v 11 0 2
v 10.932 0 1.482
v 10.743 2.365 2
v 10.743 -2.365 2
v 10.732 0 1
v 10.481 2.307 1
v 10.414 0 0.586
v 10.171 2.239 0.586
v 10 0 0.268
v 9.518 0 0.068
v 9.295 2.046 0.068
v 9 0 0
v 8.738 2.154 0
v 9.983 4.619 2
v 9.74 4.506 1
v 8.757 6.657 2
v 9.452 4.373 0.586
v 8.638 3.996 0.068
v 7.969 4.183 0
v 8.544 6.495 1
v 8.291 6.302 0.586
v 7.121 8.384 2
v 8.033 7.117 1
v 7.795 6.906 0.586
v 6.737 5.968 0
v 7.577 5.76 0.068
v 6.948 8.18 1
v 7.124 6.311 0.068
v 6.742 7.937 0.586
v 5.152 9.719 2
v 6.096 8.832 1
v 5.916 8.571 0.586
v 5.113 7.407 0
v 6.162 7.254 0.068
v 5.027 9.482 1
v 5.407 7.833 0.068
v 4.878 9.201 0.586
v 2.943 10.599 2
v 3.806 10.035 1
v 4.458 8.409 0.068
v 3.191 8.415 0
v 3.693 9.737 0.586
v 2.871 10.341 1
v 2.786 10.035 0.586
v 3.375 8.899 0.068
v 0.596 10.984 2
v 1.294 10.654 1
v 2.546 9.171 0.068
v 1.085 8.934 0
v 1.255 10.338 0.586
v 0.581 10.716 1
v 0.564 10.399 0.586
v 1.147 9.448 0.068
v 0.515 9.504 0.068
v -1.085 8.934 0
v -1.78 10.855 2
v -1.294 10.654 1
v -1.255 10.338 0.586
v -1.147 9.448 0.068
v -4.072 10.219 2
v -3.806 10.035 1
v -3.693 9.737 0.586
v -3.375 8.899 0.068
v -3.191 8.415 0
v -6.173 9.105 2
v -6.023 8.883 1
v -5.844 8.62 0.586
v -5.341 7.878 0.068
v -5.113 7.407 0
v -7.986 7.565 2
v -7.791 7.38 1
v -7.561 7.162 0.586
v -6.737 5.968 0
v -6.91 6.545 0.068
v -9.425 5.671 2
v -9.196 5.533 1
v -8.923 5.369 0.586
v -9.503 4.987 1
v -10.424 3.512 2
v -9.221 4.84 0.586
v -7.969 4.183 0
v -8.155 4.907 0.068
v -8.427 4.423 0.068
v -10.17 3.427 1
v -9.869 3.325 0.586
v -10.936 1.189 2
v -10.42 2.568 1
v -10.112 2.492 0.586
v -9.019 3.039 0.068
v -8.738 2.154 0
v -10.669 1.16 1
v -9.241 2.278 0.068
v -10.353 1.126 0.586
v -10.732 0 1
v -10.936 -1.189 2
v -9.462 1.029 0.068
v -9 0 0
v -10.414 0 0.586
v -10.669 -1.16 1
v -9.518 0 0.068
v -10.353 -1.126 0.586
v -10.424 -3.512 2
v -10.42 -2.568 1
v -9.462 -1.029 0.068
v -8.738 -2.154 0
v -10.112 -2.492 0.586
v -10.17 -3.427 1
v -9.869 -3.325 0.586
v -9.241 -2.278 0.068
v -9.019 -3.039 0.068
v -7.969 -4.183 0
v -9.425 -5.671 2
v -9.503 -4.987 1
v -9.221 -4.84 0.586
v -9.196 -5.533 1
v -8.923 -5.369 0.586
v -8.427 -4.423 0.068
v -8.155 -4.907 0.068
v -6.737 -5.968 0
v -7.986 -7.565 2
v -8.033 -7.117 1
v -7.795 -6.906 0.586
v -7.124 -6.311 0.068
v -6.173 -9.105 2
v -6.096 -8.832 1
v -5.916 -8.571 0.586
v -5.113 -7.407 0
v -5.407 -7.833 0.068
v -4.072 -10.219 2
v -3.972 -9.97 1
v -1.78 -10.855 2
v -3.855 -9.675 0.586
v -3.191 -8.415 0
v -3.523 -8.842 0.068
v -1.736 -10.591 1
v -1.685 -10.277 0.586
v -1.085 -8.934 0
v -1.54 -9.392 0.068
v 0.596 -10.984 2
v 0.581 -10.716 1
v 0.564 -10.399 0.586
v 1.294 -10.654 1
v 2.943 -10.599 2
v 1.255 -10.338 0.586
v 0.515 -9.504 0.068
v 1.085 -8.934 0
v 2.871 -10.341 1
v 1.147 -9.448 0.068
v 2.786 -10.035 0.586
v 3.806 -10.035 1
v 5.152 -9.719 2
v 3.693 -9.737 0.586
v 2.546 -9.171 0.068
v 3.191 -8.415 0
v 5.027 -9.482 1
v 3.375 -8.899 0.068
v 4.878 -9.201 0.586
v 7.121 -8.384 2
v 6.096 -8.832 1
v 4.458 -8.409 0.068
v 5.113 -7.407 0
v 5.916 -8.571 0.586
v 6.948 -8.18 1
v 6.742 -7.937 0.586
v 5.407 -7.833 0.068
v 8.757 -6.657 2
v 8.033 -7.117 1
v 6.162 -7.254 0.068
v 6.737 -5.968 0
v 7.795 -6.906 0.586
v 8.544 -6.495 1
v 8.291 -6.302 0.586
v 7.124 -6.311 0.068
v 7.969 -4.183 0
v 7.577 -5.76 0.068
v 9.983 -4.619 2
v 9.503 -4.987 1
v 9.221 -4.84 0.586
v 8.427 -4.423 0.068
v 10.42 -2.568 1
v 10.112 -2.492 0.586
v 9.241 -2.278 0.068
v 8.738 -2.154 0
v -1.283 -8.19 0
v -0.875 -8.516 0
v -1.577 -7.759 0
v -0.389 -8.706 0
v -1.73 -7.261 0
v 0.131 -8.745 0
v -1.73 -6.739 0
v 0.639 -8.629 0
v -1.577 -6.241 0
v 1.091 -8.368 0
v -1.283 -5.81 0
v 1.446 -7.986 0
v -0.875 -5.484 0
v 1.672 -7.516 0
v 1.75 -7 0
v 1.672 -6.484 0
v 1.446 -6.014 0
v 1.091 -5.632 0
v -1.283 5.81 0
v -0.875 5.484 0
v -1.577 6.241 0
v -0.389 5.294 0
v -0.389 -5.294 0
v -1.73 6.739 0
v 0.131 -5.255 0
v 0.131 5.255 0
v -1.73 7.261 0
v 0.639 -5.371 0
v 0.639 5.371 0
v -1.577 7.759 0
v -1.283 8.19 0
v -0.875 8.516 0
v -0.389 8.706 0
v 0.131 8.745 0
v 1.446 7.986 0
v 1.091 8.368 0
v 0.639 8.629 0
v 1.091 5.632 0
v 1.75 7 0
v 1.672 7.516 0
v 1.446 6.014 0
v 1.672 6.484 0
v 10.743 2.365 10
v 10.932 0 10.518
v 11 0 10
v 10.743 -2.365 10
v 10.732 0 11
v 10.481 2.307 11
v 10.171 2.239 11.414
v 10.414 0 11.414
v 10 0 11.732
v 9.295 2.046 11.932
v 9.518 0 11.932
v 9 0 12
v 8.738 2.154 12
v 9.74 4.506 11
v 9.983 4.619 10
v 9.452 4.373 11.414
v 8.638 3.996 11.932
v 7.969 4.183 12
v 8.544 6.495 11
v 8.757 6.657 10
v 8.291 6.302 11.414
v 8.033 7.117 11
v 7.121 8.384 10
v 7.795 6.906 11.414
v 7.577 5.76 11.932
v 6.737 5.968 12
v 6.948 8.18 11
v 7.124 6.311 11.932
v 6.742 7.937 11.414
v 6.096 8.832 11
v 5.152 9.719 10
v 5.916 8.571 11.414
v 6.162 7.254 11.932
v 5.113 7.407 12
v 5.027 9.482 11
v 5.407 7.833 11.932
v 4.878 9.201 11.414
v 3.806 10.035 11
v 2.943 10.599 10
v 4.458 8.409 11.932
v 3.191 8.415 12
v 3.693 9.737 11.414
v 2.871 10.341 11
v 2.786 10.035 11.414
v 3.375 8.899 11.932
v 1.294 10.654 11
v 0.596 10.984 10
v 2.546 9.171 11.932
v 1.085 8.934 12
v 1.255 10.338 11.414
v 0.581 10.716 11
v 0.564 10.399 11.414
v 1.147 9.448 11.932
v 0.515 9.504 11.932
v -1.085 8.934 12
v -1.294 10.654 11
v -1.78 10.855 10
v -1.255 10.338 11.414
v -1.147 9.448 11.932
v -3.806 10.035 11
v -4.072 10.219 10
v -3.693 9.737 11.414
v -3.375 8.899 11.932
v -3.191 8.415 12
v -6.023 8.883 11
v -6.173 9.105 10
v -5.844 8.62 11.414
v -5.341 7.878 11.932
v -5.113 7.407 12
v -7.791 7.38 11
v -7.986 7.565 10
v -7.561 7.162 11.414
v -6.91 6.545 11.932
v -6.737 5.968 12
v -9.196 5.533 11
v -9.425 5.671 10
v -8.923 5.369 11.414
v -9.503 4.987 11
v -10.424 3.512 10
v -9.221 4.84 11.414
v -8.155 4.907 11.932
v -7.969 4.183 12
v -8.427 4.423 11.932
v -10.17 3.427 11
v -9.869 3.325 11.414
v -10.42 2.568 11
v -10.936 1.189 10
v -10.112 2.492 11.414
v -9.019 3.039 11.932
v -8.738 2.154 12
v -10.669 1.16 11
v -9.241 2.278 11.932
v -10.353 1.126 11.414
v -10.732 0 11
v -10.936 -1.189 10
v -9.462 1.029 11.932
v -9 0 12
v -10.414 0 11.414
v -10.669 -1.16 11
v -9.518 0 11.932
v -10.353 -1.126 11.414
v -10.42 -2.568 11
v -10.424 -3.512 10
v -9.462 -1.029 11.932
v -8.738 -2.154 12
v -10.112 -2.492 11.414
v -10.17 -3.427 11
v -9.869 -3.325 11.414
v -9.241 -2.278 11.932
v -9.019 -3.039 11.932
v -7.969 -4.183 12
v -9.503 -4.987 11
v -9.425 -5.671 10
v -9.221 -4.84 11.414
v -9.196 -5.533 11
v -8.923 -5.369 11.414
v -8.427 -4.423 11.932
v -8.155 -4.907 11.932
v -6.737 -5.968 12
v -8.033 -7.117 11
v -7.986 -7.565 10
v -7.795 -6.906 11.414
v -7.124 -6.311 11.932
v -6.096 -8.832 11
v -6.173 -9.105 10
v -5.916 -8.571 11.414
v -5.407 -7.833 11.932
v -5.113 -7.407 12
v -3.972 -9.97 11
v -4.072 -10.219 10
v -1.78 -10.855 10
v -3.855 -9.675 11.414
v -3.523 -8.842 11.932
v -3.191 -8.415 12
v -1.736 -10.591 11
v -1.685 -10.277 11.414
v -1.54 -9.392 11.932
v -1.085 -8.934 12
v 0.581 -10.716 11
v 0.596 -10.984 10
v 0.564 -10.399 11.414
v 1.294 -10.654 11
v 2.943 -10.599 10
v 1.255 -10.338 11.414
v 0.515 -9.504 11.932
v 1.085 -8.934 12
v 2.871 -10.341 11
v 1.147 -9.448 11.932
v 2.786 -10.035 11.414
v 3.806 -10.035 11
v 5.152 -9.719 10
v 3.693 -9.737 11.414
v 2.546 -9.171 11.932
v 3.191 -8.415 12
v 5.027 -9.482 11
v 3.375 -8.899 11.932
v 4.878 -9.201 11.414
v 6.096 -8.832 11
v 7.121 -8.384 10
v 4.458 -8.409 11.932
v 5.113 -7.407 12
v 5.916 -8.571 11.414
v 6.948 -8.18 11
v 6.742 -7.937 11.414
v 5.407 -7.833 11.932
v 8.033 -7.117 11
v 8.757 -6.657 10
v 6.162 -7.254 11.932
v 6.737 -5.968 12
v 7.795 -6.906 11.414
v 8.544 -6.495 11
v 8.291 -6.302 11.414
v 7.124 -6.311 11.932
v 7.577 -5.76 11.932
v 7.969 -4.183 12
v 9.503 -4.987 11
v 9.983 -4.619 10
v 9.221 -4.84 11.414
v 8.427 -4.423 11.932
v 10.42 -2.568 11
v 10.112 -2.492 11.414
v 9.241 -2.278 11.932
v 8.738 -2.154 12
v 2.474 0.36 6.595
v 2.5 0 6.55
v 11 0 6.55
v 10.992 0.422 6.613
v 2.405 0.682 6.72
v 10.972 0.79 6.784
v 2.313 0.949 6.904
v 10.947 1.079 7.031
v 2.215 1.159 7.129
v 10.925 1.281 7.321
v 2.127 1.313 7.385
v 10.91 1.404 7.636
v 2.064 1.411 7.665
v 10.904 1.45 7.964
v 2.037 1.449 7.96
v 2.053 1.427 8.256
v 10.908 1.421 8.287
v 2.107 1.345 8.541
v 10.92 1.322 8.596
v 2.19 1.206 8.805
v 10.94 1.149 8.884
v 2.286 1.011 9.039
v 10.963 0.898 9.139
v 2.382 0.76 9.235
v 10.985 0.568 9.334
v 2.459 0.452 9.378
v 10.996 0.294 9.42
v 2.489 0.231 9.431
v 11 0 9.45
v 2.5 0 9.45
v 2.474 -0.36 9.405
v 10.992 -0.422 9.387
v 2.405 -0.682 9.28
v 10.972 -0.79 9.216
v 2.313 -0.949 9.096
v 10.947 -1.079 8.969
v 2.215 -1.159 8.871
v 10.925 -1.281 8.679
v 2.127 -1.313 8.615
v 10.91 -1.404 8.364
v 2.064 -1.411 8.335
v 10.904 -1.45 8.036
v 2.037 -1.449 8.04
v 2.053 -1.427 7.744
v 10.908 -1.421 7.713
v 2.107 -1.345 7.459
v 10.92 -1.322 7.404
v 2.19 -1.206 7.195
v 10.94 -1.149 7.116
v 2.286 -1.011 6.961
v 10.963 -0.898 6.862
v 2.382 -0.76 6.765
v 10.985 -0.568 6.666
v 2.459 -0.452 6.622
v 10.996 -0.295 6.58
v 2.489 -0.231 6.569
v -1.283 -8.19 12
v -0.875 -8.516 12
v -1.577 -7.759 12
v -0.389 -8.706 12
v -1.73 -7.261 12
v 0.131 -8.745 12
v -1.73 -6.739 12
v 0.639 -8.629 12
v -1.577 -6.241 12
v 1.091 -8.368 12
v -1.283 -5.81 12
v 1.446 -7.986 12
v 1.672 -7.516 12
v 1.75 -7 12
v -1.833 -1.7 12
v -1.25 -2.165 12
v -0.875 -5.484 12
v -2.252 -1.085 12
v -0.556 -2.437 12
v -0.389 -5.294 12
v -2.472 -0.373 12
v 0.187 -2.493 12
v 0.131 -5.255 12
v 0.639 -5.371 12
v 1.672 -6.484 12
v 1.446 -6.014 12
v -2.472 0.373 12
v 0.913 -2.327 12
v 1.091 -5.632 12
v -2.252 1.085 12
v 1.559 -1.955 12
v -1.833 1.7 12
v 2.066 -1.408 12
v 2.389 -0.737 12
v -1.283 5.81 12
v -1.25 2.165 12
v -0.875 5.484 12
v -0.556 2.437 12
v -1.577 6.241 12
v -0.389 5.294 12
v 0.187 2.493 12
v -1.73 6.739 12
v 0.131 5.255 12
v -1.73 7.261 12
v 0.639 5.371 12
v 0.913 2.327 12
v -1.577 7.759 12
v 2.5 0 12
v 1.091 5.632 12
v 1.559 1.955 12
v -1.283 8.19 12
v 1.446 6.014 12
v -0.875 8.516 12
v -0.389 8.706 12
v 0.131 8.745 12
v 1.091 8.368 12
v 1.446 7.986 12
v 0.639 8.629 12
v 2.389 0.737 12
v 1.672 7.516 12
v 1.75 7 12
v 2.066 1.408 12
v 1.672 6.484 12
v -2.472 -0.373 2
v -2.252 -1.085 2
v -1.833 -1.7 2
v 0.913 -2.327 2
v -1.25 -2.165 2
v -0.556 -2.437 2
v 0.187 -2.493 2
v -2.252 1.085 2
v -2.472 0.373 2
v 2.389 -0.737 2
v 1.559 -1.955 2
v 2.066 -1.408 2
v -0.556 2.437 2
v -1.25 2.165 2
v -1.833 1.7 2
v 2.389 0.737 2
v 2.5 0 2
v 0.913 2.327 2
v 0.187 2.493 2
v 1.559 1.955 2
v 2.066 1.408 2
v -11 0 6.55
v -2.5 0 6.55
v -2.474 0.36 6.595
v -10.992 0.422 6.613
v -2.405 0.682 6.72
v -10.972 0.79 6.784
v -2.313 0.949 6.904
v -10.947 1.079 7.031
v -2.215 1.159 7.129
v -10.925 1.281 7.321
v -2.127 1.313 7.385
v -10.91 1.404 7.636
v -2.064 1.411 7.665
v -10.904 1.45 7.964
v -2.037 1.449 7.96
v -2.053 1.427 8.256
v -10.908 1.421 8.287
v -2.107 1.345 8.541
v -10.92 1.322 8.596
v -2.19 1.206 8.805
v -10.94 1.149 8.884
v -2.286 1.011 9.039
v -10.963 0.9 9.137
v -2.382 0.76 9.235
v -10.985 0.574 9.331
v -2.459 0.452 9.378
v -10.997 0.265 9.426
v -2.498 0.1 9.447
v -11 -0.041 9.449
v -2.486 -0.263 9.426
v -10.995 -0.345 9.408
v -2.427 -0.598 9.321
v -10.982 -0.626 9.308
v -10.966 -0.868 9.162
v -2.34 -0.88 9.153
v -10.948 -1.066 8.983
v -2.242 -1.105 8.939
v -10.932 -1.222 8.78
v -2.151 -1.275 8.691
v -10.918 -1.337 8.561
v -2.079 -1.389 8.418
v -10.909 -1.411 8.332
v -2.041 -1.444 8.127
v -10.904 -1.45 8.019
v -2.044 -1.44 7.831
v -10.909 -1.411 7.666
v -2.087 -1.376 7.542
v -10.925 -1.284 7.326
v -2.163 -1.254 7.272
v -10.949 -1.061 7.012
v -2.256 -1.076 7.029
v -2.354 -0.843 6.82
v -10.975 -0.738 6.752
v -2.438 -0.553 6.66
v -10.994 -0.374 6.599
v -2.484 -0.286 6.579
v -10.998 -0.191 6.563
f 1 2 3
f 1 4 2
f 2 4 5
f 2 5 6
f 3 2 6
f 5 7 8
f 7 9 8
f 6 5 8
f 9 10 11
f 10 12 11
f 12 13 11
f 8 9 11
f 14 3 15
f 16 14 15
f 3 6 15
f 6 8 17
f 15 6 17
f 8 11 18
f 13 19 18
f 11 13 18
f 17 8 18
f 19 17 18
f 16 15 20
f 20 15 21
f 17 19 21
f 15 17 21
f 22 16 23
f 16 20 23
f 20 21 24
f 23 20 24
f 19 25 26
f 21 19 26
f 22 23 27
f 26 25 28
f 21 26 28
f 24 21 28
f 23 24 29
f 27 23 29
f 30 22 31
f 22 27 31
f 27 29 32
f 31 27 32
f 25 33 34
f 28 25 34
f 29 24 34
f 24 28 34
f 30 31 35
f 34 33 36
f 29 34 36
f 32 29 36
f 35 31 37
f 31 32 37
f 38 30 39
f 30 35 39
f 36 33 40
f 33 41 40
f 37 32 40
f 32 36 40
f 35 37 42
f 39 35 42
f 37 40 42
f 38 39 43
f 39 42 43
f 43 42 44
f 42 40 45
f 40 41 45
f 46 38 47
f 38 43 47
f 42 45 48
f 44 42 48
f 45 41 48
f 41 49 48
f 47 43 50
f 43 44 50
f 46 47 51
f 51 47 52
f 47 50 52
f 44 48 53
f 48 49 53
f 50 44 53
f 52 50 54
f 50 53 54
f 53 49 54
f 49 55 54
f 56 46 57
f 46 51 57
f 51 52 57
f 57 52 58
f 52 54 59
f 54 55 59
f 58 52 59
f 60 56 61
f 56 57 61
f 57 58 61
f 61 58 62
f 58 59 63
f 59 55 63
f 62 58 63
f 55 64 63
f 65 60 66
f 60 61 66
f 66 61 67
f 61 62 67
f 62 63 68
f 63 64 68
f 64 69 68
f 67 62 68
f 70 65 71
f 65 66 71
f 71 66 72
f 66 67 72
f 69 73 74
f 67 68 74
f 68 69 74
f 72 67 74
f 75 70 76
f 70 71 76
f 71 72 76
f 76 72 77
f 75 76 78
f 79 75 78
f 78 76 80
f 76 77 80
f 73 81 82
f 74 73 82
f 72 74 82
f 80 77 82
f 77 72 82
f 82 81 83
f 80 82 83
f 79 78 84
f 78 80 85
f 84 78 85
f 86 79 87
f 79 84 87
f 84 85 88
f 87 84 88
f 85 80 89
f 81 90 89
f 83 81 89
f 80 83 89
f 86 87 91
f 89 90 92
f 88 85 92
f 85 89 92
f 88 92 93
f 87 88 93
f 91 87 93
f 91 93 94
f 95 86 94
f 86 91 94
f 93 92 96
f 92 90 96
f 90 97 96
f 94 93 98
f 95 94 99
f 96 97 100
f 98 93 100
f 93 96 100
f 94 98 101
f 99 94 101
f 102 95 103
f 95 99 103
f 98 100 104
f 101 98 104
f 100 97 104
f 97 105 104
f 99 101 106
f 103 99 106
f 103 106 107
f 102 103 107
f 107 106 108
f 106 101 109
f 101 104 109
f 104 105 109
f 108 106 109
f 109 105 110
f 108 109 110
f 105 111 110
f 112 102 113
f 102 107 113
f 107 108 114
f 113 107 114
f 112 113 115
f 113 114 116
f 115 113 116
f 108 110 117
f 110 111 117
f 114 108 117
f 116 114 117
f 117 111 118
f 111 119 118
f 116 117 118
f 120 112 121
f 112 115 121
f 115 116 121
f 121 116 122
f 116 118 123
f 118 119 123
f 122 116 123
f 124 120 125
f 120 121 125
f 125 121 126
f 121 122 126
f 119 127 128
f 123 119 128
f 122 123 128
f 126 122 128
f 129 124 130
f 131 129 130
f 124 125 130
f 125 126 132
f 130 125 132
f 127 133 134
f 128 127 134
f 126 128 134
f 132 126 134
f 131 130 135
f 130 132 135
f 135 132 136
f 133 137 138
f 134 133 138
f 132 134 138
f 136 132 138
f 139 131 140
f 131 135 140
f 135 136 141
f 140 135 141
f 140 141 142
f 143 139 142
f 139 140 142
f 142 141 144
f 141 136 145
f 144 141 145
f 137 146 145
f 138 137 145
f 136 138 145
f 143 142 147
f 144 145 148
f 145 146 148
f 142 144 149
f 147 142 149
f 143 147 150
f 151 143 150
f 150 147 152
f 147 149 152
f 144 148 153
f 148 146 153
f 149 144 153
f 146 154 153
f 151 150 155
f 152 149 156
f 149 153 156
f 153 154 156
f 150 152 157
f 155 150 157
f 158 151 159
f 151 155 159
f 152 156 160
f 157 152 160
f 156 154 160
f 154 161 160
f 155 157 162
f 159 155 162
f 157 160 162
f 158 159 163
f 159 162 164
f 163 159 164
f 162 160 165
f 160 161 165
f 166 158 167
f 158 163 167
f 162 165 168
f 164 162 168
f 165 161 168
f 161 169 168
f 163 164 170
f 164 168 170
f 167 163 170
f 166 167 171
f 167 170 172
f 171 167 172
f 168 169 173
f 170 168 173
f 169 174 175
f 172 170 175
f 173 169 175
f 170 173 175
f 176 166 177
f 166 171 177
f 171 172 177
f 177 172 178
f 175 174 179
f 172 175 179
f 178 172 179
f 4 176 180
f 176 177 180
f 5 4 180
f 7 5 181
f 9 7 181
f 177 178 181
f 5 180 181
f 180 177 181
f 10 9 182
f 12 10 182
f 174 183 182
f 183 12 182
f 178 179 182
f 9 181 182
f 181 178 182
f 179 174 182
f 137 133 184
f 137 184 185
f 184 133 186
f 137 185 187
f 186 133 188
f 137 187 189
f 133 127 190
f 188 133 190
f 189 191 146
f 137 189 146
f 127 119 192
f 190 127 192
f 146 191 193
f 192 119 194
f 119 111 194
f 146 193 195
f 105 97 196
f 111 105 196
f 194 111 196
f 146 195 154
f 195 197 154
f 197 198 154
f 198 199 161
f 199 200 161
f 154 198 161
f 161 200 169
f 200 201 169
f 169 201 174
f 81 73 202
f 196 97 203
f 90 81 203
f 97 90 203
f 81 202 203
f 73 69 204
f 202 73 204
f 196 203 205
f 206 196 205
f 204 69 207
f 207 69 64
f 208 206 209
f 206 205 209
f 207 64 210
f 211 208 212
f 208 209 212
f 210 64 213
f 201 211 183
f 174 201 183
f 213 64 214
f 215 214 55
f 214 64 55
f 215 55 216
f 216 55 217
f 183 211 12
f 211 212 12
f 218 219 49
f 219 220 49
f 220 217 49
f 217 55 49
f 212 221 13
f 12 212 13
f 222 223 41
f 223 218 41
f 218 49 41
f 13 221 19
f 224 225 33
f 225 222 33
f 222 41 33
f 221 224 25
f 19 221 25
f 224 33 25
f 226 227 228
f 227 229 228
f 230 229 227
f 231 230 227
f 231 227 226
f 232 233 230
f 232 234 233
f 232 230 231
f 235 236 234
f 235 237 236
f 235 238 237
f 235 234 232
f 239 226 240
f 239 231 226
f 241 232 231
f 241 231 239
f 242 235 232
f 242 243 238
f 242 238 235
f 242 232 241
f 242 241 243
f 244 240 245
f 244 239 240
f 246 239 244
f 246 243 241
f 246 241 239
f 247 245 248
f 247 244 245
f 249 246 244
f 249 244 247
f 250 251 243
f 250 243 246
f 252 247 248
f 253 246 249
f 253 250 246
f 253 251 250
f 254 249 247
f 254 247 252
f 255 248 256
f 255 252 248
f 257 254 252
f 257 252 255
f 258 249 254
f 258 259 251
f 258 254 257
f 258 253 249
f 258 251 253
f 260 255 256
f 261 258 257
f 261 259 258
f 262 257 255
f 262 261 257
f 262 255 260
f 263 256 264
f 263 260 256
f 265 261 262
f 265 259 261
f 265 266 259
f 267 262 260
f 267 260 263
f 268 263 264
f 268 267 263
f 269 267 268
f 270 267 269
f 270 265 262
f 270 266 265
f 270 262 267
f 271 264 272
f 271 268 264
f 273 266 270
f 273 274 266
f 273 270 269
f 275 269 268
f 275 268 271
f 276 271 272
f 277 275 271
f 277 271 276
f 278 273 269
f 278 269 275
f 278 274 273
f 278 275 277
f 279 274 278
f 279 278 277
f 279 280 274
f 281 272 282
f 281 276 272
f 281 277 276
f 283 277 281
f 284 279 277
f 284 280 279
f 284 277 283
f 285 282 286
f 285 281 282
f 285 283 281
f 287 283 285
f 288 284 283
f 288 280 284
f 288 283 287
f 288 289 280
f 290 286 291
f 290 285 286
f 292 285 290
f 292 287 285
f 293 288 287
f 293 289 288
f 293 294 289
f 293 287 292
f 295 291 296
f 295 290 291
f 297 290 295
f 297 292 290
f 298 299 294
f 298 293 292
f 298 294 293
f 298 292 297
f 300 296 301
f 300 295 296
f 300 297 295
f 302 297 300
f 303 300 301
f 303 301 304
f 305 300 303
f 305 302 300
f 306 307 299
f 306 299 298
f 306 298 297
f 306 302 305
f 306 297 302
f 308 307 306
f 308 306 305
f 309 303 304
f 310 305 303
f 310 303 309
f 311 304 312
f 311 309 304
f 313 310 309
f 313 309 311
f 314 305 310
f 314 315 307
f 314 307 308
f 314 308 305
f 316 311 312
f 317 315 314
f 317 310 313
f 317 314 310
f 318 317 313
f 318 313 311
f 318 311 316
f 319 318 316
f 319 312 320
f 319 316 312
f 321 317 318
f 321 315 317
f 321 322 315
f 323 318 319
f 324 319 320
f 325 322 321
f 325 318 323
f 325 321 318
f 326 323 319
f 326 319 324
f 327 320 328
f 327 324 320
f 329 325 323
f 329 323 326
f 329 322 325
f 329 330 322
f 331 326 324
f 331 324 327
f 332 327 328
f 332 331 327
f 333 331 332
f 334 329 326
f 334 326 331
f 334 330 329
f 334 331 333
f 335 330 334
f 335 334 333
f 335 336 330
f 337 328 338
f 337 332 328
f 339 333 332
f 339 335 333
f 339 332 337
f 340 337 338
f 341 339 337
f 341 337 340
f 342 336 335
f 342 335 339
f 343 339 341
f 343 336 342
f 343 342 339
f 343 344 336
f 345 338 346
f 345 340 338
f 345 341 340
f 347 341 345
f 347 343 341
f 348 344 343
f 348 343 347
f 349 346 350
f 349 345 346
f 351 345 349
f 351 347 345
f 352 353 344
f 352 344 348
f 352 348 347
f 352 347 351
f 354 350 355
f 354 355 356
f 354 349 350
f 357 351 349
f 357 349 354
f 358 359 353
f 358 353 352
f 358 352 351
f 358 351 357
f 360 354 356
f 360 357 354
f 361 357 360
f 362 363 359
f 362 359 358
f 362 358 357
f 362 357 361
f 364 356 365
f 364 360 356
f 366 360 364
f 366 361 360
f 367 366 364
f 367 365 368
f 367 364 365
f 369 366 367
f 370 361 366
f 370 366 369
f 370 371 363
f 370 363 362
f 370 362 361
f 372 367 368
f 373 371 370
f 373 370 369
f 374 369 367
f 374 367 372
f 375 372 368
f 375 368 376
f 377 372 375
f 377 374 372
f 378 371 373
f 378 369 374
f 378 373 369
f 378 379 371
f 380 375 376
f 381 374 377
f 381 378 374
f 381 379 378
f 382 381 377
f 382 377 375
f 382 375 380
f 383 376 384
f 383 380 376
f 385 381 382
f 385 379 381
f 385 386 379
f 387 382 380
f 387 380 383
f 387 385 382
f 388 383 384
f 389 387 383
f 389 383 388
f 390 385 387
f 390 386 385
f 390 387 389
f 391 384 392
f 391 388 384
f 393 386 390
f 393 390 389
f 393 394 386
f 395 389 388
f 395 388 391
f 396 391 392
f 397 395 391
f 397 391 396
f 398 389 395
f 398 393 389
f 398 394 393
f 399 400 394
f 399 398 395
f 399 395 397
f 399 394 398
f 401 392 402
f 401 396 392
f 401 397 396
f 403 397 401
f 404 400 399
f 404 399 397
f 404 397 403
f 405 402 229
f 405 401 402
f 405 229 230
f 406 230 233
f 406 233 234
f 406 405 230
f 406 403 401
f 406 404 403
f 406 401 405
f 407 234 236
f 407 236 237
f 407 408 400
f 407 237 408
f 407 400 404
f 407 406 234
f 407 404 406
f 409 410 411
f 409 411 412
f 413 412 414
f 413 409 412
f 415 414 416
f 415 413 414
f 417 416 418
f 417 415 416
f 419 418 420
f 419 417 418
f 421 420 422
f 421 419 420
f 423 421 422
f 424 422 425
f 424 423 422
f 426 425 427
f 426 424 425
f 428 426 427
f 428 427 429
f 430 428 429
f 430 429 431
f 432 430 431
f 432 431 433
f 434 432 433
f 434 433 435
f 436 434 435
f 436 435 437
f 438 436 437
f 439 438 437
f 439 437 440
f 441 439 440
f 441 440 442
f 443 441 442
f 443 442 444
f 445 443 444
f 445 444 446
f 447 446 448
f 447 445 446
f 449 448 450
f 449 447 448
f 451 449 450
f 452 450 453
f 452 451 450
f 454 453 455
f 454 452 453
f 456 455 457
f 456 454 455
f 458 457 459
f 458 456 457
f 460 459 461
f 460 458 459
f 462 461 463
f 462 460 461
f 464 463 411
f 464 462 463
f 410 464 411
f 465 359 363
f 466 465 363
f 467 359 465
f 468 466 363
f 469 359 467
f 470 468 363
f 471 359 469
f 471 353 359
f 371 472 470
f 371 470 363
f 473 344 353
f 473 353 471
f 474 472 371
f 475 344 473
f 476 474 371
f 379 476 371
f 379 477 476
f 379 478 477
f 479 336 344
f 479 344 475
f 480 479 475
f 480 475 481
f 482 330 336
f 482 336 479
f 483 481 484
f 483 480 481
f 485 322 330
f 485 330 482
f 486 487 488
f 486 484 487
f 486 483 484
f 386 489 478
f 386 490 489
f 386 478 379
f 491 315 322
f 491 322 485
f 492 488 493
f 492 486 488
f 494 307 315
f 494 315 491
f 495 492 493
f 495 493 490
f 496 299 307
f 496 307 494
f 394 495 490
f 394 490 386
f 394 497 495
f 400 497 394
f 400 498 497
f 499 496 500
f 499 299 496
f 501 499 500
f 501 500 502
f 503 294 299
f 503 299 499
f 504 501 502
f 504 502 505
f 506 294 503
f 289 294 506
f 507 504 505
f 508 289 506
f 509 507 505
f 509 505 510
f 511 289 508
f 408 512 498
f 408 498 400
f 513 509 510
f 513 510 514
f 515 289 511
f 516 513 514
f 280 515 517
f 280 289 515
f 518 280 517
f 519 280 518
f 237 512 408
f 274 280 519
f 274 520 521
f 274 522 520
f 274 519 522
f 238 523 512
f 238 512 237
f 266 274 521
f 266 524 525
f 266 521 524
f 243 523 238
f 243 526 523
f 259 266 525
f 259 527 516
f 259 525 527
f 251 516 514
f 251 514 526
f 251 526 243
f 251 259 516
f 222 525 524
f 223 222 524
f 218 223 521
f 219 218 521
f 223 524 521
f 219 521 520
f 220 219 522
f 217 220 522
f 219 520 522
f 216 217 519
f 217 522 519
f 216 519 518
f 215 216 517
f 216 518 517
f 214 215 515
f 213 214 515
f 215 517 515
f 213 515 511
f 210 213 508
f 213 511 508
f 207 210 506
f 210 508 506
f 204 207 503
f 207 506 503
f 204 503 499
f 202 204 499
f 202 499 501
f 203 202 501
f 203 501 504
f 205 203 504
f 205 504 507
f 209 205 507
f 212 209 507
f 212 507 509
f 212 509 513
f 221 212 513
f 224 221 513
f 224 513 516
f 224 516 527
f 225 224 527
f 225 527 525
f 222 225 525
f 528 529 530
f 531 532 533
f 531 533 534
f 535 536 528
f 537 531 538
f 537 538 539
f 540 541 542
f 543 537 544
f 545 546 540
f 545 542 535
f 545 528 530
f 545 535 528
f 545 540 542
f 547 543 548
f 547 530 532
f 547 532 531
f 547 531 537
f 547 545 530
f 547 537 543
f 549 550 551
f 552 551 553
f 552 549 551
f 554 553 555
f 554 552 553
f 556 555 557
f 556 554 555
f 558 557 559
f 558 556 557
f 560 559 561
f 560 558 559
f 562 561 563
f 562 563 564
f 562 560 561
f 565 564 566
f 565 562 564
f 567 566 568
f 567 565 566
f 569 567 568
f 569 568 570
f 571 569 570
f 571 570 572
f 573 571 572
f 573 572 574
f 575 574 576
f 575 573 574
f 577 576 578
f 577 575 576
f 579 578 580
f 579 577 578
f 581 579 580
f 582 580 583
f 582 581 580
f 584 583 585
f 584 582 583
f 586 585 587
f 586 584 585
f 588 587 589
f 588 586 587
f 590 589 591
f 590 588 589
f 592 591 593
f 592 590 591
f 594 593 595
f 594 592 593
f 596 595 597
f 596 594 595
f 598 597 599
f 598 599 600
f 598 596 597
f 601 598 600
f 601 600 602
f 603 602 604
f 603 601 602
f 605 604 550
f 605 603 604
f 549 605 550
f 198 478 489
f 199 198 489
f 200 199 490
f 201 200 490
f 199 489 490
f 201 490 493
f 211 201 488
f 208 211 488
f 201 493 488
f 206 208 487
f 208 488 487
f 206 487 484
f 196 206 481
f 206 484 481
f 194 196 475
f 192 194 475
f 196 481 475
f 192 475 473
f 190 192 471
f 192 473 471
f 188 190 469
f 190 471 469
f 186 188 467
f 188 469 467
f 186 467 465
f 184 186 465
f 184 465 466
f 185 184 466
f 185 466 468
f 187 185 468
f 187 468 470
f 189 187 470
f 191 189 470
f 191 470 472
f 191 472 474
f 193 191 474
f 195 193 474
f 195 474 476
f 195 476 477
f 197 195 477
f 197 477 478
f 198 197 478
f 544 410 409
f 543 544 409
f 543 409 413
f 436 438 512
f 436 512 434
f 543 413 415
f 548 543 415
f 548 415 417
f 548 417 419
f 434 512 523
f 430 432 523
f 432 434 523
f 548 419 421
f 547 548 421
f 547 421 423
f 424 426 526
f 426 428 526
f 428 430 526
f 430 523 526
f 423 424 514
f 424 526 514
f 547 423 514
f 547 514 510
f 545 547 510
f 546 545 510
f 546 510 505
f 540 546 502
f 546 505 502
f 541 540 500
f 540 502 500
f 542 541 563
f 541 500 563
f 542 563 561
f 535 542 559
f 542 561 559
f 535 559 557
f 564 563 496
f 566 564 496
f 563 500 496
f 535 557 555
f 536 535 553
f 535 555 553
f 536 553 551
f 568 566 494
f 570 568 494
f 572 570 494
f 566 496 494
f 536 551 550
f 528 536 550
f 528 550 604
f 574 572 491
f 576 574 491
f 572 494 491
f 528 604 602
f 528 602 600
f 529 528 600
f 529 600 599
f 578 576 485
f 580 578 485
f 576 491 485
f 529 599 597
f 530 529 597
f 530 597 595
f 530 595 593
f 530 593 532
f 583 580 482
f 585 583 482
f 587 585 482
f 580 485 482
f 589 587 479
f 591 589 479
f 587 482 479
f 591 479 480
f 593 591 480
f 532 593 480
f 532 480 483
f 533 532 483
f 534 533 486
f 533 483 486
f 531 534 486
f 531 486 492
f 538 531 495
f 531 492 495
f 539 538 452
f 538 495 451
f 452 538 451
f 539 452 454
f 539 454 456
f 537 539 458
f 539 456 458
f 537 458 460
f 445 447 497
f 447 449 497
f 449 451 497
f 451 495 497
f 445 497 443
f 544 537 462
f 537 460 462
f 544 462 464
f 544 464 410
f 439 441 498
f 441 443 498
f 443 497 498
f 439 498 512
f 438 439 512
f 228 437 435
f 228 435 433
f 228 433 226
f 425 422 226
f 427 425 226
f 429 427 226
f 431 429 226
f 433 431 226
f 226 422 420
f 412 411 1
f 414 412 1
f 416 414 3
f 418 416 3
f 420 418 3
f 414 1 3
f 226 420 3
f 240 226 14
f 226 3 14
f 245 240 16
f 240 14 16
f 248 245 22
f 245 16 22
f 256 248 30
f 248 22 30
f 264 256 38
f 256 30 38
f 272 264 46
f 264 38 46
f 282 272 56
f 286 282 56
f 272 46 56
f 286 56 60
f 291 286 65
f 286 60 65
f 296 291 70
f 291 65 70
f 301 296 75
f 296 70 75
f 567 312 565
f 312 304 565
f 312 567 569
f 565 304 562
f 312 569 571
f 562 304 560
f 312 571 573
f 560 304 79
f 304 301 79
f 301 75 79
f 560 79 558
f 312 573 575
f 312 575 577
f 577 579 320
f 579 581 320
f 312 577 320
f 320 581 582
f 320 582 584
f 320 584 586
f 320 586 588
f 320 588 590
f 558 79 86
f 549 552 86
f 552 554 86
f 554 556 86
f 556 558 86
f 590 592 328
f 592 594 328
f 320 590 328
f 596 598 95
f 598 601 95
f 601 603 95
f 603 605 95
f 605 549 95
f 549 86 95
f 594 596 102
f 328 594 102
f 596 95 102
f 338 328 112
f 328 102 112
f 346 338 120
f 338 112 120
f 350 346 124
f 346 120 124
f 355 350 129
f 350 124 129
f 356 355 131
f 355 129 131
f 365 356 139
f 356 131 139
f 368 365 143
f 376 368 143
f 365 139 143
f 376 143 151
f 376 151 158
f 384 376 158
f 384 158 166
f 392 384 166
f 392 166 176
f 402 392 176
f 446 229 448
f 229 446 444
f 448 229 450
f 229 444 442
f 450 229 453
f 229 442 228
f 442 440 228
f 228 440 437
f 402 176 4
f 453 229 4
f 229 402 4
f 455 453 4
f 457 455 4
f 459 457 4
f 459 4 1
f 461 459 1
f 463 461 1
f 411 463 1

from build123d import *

# Parameters (mm, degrees)
SKETCH_1_R               = 11
EXTRUDE_1_DEPTH          = 12
SKETCH_3_R               = 1.75
CUT_EXTRUDE_1_DEPTH      = 20.646882704
SKETCH_4_R               = 2.5
CUT_EXTRUDE_2_DEPTH      = 10
CUT_EXTRUDE_3_DEPTH      = 20.646882704
CUT_EXTRUDE_3_DEPTH_BACK = 20.646882704
SKETCH_5_R               = 1.45
FILLET_1_R               = 2


with BuildPart() as part:
    # 草图1 → 凸台-拉伸1 (new body)
    with BuildSketch(Plane.XY):
        Circle(SKETCH_1_R)
    extrude(amount=EXTRUDE_1_DEPTH)

    # 草图3 → 切除-拉伸1 (cut, through all)
    with BuildSketch(Plane.XY.offset(12)):
        with Locations((0, 7)):
            Circle(SKETCH_3_R)
        with Locations((0, -7)):
            Circle(SKETCH_3_R)
    extrude(amount=-CUT_EXTRUDE_1_DEPTH, mode=Mode.SUBTRACT)

    # 草图4 → 切除-拉伸2 (cut)
    with BuildSketch(Plane.XY.offset(12)):
        Circle(SKETCH_4_R)
    extrude(amount=-CUT_EXTRUDE_2_DEPTH, mode=Mode.SUBTRACT)

    # 草图5 → 切除-拉伸3 (cut, two sides: drawn at the far end of the back side and taken through both)
    with BuildSketch(Plane(origin=(0, 0, 0), x_dir=(0, 0, -1), z_dir=(1, 0, 0)).offset(-CUT_EXTRUDE_3_DEPTH_BACK)):
        with Locations((-8, 0)):
            Circle(SKETCH_5_R)
    extrude(amount=CUT_EXTRUDE_3_DEPTH + CUT_EXTRUDE_3_DEPTH_BACK, mode=Mode.SUBTRACT)

    # 圆角1
    fillet_1_edges = [part.edges().sort_by_distance(p)[0] for p in [
        (-11, 0, 0),
        (-11, 0, 12),
    ]]
    fillet(fillet_1_edges, radius=FILLET_1_R)


solid = part.part
